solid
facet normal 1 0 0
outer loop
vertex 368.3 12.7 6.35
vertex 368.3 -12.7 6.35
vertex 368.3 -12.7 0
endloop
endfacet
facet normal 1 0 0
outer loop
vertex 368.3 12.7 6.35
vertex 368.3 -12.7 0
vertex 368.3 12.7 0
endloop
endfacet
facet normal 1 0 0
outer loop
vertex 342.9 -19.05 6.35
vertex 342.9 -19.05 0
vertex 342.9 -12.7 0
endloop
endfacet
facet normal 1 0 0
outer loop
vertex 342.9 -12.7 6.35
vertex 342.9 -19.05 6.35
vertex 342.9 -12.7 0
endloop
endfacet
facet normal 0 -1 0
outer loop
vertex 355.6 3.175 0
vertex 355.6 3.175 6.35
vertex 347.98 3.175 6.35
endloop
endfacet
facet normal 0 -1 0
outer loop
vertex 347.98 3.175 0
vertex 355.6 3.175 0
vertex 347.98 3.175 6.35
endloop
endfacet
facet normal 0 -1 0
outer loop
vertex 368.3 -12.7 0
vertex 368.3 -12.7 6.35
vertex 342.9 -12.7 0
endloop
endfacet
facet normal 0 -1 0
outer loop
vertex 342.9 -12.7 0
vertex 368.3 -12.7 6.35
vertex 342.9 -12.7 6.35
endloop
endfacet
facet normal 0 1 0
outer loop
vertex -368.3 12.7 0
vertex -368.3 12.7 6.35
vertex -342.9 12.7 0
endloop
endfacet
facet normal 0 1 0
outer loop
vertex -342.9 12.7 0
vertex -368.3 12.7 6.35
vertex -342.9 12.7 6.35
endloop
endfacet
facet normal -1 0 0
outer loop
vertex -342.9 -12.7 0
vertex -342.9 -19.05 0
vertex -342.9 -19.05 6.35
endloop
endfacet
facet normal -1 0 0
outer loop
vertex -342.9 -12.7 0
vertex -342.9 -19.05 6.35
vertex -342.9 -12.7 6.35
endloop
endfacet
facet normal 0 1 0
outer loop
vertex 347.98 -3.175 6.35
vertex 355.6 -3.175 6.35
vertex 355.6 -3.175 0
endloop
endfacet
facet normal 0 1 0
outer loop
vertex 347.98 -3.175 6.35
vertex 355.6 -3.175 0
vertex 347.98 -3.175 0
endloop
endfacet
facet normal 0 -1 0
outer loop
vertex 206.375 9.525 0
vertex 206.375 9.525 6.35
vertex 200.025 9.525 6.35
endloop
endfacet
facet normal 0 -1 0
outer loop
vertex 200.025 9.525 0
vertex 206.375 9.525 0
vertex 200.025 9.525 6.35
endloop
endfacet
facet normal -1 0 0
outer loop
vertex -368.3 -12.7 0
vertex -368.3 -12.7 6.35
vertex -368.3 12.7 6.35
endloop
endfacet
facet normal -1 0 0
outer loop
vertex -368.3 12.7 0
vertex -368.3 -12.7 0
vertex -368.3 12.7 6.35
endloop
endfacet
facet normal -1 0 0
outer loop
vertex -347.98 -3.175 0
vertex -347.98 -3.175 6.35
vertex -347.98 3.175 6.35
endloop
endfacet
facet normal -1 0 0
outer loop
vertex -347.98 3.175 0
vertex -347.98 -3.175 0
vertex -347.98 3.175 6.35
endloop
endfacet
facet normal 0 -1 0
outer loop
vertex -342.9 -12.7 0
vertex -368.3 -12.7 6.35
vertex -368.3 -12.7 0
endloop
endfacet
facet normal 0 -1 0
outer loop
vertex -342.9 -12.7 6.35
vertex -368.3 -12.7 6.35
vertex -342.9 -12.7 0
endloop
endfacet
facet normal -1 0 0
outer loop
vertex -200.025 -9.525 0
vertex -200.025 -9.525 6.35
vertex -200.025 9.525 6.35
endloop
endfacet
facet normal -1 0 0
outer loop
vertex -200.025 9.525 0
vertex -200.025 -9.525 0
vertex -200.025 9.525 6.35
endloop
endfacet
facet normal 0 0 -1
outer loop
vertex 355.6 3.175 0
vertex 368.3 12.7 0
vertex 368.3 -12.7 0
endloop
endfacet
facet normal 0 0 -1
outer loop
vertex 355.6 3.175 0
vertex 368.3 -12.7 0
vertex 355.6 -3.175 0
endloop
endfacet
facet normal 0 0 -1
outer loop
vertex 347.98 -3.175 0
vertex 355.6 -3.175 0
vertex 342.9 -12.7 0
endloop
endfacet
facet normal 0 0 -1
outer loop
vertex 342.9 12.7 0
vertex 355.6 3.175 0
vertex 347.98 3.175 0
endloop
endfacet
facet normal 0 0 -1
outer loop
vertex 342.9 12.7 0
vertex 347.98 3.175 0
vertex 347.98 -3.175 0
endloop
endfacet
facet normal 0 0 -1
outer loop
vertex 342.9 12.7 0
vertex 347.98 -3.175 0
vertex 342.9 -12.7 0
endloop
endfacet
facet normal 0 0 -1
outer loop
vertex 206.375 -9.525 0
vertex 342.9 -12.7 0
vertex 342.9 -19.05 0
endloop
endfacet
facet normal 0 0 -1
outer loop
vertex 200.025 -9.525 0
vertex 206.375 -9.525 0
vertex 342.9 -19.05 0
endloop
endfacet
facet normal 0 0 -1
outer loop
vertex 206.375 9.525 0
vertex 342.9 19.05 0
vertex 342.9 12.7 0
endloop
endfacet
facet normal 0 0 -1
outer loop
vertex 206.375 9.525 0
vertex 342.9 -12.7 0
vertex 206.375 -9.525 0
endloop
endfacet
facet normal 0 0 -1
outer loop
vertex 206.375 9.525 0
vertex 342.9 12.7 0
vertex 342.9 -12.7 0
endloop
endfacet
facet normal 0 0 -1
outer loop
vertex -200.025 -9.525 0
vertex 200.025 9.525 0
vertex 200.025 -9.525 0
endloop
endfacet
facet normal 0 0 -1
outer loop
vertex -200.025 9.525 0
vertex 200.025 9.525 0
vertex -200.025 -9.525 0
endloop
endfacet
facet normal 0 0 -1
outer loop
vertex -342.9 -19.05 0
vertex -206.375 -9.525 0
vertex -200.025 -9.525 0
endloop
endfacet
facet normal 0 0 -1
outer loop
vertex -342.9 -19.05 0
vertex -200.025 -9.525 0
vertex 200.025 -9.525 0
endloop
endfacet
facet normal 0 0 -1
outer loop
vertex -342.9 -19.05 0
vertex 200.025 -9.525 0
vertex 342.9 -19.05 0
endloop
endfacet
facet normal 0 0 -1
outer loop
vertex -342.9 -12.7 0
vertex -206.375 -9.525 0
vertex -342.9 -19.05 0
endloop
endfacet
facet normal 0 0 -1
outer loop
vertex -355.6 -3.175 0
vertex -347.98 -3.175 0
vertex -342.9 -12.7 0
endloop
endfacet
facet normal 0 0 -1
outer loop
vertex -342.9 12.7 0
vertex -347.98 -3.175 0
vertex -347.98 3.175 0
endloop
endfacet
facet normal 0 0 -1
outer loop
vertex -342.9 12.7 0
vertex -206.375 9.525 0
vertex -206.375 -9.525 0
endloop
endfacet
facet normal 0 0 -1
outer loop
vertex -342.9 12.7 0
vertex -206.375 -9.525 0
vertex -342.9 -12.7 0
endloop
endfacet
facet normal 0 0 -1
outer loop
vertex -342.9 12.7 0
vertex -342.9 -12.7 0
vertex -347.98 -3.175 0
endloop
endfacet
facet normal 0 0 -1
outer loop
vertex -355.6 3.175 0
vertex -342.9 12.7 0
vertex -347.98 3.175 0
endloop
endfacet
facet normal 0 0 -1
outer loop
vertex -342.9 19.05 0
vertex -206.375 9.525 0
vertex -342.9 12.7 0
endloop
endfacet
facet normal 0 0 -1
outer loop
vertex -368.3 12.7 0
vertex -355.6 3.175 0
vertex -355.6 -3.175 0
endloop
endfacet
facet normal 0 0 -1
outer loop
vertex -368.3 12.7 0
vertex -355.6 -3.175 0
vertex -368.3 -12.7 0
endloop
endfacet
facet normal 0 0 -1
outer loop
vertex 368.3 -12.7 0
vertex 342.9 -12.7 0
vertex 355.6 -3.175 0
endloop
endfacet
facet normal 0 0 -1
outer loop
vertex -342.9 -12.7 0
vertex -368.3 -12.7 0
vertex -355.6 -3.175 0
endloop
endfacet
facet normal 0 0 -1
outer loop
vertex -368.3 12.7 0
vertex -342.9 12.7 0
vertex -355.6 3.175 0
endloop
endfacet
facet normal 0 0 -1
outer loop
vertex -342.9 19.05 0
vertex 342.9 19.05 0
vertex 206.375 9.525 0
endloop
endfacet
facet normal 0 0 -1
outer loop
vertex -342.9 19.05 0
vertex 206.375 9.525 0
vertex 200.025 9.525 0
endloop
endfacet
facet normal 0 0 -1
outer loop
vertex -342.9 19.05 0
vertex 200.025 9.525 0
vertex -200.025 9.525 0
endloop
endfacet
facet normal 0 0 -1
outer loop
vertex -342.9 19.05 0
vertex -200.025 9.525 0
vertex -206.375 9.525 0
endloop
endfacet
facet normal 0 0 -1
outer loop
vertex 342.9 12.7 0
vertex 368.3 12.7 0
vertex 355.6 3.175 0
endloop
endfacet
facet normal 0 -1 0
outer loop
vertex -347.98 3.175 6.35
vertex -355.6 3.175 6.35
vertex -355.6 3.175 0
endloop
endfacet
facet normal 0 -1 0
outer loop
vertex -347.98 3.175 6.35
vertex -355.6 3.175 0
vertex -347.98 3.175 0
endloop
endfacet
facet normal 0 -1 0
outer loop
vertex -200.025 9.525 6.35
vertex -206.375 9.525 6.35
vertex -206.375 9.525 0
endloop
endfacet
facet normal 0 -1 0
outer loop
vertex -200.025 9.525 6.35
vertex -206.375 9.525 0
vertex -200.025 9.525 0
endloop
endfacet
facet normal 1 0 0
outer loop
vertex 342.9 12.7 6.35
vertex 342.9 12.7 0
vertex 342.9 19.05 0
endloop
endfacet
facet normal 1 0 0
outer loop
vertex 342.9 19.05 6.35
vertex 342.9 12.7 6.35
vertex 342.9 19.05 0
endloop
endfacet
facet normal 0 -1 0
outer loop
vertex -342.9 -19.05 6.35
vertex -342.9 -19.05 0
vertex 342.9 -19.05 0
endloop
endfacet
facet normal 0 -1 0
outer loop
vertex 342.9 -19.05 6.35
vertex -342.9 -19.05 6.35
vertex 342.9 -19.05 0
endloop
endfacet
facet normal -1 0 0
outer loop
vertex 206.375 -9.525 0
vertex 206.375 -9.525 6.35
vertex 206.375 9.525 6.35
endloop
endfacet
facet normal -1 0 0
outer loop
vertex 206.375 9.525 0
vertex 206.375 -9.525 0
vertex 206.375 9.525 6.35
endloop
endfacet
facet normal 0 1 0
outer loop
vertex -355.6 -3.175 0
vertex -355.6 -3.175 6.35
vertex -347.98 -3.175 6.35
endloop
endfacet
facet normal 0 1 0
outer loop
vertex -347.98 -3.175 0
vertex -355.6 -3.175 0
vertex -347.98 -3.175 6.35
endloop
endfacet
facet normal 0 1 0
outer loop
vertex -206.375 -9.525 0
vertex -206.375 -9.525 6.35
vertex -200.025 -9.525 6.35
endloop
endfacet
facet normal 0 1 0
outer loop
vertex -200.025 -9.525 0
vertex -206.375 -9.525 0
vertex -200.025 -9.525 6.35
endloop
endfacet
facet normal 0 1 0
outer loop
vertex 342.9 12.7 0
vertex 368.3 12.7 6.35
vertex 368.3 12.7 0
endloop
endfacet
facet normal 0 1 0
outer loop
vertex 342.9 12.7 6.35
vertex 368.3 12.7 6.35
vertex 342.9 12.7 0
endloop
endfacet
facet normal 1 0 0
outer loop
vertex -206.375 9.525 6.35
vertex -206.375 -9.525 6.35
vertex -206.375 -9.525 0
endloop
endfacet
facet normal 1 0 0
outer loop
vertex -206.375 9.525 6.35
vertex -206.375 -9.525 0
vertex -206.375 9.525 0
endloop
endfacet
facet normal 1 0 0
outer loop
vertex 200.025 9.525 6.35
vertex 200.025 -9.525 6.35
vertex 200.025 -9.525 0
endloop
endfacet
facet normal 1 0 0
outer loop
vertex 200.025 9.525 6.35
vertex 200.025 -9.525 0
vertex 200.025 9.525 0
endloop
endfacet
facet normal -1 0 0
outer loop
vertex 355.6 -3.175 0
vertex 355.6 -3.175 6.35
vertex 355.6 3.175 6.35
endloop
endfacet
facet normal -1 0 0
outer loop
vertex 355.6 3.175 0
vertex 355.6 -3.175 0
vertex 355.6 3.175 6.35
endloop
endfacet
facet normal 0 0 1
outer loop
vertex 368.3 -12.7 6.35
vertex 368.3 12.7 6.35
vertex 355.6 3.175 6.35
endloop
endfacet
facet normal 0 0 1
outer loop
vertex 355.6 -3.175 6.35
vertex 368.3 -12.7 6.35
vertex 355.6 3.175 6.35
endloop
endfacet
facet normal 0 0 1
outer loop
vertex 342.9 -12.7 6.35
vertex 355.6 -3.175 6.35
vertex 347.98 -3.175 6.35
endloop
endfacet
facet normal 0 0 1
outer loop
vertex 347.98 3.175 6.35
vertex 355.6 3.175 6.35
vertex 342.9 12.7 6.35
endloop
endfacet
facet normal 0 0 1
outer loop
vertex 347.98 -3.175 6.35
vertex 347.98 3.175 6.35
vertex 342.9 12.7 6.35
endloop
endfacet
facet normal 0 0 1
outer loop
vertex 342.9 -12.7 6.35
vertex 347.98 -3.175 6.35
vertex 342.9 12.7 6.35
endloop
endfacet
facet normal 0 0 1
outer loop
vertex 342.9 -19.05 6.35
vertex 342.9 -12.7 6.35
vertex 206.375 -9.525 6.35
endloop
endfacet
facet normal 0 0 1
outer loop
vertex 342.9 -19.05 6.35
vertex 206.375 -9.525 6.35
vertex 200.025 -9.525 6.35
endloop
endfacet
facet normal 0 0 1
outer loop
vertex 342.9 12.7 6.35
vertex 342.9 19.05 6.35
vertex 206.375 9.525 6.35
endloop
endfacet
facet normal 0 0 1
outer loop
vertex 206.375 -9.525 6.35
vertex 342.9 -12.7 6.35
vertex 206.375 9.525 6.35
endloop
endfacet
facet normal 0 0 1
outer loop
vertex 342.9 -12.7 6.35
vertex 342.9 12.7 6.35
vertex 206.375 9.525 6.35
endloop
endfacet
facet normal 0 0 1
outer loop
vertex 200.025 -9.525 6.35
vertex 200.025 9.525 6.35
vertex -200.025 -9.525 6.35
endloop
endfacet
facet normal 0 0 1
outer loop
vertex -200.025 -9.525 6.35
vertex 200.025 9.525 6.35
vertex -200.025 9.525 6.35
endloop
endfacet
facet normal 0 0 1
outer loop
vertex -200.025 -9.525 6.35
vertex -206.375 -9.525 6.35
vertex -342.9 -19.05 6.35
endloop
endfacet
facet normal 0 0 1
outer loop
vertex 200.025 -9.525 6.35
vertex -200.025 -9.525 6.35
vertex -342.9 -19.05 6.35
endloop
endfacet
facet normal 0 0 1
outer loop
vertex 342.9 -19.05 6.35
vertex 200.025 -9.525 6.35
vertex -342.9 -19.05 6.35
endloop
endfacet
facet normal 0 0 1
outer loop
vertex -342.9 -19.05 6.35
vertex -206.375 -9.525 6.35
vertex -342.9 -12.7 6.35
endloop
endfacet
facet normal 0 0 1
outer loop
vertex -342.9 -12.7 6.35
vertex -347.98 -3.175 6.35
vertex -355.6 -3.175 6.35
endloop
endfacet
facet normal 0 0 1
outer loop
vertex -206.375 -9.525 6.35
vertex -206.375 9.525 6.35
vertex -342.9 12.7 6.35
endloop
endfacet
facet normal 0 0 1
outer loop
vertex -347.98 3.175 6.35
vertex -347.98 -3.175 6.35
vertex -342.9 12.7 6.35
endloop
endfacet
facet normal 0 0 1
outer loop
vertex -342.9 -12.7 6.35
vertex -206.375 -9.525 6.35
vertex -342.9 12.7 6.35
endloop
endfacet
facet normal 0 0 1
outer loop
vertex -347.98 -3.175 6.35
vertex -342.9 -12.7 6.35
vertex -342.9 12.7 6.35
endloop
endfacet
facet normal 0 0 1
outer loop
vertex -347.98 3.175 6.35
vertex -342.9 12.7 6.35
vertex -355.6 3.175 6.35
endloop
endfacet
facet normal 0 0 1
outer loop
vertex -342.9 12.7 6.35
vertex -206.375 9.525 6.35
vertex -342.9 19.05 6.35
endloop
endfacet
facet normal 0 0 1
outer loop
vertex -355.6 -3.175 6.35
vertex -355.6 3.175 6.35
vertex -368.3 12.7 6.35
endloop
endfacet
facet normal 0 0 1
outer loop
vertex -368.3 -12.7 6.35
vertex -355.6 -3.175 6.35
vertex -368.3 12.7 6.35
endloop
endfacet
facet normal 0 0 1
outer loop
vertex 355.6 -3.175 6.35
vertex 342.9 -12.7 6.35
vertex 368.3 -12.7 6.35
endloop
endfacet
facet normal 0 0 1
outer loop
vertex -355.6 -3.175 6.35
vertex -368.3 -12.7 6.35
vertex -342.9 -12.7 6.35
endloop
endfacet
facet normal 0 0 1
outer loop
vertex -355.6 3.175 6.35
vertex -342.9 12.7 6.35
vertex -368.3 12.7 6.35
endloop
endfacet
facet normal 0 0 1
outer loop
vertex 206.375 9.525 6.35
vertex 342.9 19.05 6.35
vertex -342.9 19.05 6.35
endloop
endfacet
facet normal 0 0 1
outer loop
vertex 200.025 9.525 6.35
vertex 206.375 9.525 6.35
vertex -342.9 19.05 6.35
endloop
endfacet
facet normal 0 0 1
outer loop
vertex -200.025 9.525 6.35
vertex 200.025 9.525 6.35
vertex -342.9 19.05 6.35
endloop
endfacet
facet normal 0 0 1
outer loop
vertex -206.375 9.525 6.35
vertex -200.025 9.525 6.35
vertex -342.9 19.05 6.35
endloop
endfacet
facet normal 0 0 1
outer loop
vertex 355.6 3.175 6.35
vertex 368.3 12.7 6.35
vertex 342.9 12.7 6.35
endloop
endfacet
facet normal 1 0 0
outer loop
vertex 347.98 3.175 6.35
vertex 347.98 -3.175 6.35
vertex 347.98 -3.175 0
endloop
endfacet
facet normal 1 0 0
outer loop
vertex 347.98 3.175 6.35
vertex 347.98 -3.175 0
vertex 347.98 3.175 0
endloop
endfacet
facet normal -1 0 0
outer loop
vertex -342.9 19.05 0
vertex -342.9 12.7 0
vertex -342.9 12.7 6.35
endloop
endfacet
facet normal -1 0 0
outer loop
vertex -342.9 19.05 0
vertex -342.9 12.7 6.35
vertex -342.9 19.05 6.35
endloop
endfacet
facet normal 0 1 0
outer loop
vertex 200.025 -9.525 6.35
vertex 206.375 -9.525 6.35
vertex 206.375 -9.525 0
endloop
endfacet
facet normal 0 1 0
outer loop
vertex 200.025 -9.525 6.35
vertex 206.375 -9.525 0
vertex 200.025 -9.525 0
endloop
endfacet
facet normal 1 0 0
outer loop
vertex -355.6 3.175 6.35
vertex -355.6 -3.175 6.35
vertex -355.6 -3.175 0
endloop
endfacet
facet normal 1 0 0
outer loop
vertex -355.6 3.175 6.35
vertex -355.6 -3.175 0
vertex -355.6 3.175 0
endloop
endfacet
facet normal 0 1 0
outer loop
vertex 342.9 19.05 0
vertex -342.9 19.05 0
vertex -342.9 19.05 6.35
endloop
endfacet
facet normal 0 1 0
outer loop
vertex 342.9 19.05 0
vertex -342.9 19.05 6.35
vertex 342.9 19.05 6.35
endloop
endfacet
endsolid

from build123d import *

# Parameters (mm, degrees)
SKETCH1_W           = 685.8
SKETCH1_H           = 38.1
BOSS_EXTRUDE1_DEPTH = 6.35
SKETCH2_W           = 50.8
SKETCH2_H           = 25.4
BOSS_EXTRUDE2_DEPTH = 6.35
SKETCH3_W           = 7.62
SKETCH3_H           = 6.35
CUT_EXTRUDE1_DEPTH  = 7.35
SKETCH4_W           = 6.35
SKETCH4_H           = 19.05
CUT_EXTRUDE2_DEPTH  = 7.35


with BuildPart() as part:
    # Sketch1 → Boss-Extrude1 (new body)
    with BuildSketch(Plane.XY):
        Rectangle(SKETCH1_W, SKETCH1_H)
    extrude(amount=BOSS_EXTRUDE1_DEPTH)

    # Sketch2 → Boss-Extrude2 (add)
    with BuildSketch(Plane.XY.offset(6.35)):
        with Locations((-342.9, 0)):
            Rectangle(SKETCH2_W, SKETCH2_H)
    boss_extrude2 = extrude(amount=-BOSS_EXTRUDE2_DEPTH)

    # Sketch3 → Cut-Extrude1 (cut, through all)
    with BuildSketch(Plane.XY.offset(6.35)):
        with Locations((-351.79, 0)):
            Rectangle(SKETCH3_W, SKETCH3_H)
    cut_extrude1 = extrude(amount=-CUT_EXTRUDE1_DEPTH, mode=Mode.SUBTRACT)

    # Mirror1: Boss-Extrude2, Cut-Extrude1 across plane
    add(boss_extrude2.mirror(Plane(origin=(0, 0, 0), x_dir=(0, 0, 1), z_dir=(1, 0, 0))))
    add(cut_extrude1.mirror(Plane(origin=(0, 0, 0), x_dir=(0, 0, 1), z_dir=(1, 0, 0))), mode=Mode.SUBTRACT)

    # Sketch4 → Cut-Extrude2 (cut, through all)
    with BuildSketch(Plane.XY.offset(6.35)):
        with Locations((-203.2, 0)):
            Rectangle(SKETCH4_W, SKETCH4_H)
    cut_extrude2 = extrude(amount=-CUT_EXTRUDE2_DEPTH, mode=Mode.SUBTRACT)

    # Mirror2: Cut-Extrude2 across plane
    add(cut_extrude2.mirror(Plane(origin=(0, 0, 0), x_dir=(0, 0, 1), z_dir=(1, 0, 0))), mode=Mode.SUBTRACT)


solid = part.part
